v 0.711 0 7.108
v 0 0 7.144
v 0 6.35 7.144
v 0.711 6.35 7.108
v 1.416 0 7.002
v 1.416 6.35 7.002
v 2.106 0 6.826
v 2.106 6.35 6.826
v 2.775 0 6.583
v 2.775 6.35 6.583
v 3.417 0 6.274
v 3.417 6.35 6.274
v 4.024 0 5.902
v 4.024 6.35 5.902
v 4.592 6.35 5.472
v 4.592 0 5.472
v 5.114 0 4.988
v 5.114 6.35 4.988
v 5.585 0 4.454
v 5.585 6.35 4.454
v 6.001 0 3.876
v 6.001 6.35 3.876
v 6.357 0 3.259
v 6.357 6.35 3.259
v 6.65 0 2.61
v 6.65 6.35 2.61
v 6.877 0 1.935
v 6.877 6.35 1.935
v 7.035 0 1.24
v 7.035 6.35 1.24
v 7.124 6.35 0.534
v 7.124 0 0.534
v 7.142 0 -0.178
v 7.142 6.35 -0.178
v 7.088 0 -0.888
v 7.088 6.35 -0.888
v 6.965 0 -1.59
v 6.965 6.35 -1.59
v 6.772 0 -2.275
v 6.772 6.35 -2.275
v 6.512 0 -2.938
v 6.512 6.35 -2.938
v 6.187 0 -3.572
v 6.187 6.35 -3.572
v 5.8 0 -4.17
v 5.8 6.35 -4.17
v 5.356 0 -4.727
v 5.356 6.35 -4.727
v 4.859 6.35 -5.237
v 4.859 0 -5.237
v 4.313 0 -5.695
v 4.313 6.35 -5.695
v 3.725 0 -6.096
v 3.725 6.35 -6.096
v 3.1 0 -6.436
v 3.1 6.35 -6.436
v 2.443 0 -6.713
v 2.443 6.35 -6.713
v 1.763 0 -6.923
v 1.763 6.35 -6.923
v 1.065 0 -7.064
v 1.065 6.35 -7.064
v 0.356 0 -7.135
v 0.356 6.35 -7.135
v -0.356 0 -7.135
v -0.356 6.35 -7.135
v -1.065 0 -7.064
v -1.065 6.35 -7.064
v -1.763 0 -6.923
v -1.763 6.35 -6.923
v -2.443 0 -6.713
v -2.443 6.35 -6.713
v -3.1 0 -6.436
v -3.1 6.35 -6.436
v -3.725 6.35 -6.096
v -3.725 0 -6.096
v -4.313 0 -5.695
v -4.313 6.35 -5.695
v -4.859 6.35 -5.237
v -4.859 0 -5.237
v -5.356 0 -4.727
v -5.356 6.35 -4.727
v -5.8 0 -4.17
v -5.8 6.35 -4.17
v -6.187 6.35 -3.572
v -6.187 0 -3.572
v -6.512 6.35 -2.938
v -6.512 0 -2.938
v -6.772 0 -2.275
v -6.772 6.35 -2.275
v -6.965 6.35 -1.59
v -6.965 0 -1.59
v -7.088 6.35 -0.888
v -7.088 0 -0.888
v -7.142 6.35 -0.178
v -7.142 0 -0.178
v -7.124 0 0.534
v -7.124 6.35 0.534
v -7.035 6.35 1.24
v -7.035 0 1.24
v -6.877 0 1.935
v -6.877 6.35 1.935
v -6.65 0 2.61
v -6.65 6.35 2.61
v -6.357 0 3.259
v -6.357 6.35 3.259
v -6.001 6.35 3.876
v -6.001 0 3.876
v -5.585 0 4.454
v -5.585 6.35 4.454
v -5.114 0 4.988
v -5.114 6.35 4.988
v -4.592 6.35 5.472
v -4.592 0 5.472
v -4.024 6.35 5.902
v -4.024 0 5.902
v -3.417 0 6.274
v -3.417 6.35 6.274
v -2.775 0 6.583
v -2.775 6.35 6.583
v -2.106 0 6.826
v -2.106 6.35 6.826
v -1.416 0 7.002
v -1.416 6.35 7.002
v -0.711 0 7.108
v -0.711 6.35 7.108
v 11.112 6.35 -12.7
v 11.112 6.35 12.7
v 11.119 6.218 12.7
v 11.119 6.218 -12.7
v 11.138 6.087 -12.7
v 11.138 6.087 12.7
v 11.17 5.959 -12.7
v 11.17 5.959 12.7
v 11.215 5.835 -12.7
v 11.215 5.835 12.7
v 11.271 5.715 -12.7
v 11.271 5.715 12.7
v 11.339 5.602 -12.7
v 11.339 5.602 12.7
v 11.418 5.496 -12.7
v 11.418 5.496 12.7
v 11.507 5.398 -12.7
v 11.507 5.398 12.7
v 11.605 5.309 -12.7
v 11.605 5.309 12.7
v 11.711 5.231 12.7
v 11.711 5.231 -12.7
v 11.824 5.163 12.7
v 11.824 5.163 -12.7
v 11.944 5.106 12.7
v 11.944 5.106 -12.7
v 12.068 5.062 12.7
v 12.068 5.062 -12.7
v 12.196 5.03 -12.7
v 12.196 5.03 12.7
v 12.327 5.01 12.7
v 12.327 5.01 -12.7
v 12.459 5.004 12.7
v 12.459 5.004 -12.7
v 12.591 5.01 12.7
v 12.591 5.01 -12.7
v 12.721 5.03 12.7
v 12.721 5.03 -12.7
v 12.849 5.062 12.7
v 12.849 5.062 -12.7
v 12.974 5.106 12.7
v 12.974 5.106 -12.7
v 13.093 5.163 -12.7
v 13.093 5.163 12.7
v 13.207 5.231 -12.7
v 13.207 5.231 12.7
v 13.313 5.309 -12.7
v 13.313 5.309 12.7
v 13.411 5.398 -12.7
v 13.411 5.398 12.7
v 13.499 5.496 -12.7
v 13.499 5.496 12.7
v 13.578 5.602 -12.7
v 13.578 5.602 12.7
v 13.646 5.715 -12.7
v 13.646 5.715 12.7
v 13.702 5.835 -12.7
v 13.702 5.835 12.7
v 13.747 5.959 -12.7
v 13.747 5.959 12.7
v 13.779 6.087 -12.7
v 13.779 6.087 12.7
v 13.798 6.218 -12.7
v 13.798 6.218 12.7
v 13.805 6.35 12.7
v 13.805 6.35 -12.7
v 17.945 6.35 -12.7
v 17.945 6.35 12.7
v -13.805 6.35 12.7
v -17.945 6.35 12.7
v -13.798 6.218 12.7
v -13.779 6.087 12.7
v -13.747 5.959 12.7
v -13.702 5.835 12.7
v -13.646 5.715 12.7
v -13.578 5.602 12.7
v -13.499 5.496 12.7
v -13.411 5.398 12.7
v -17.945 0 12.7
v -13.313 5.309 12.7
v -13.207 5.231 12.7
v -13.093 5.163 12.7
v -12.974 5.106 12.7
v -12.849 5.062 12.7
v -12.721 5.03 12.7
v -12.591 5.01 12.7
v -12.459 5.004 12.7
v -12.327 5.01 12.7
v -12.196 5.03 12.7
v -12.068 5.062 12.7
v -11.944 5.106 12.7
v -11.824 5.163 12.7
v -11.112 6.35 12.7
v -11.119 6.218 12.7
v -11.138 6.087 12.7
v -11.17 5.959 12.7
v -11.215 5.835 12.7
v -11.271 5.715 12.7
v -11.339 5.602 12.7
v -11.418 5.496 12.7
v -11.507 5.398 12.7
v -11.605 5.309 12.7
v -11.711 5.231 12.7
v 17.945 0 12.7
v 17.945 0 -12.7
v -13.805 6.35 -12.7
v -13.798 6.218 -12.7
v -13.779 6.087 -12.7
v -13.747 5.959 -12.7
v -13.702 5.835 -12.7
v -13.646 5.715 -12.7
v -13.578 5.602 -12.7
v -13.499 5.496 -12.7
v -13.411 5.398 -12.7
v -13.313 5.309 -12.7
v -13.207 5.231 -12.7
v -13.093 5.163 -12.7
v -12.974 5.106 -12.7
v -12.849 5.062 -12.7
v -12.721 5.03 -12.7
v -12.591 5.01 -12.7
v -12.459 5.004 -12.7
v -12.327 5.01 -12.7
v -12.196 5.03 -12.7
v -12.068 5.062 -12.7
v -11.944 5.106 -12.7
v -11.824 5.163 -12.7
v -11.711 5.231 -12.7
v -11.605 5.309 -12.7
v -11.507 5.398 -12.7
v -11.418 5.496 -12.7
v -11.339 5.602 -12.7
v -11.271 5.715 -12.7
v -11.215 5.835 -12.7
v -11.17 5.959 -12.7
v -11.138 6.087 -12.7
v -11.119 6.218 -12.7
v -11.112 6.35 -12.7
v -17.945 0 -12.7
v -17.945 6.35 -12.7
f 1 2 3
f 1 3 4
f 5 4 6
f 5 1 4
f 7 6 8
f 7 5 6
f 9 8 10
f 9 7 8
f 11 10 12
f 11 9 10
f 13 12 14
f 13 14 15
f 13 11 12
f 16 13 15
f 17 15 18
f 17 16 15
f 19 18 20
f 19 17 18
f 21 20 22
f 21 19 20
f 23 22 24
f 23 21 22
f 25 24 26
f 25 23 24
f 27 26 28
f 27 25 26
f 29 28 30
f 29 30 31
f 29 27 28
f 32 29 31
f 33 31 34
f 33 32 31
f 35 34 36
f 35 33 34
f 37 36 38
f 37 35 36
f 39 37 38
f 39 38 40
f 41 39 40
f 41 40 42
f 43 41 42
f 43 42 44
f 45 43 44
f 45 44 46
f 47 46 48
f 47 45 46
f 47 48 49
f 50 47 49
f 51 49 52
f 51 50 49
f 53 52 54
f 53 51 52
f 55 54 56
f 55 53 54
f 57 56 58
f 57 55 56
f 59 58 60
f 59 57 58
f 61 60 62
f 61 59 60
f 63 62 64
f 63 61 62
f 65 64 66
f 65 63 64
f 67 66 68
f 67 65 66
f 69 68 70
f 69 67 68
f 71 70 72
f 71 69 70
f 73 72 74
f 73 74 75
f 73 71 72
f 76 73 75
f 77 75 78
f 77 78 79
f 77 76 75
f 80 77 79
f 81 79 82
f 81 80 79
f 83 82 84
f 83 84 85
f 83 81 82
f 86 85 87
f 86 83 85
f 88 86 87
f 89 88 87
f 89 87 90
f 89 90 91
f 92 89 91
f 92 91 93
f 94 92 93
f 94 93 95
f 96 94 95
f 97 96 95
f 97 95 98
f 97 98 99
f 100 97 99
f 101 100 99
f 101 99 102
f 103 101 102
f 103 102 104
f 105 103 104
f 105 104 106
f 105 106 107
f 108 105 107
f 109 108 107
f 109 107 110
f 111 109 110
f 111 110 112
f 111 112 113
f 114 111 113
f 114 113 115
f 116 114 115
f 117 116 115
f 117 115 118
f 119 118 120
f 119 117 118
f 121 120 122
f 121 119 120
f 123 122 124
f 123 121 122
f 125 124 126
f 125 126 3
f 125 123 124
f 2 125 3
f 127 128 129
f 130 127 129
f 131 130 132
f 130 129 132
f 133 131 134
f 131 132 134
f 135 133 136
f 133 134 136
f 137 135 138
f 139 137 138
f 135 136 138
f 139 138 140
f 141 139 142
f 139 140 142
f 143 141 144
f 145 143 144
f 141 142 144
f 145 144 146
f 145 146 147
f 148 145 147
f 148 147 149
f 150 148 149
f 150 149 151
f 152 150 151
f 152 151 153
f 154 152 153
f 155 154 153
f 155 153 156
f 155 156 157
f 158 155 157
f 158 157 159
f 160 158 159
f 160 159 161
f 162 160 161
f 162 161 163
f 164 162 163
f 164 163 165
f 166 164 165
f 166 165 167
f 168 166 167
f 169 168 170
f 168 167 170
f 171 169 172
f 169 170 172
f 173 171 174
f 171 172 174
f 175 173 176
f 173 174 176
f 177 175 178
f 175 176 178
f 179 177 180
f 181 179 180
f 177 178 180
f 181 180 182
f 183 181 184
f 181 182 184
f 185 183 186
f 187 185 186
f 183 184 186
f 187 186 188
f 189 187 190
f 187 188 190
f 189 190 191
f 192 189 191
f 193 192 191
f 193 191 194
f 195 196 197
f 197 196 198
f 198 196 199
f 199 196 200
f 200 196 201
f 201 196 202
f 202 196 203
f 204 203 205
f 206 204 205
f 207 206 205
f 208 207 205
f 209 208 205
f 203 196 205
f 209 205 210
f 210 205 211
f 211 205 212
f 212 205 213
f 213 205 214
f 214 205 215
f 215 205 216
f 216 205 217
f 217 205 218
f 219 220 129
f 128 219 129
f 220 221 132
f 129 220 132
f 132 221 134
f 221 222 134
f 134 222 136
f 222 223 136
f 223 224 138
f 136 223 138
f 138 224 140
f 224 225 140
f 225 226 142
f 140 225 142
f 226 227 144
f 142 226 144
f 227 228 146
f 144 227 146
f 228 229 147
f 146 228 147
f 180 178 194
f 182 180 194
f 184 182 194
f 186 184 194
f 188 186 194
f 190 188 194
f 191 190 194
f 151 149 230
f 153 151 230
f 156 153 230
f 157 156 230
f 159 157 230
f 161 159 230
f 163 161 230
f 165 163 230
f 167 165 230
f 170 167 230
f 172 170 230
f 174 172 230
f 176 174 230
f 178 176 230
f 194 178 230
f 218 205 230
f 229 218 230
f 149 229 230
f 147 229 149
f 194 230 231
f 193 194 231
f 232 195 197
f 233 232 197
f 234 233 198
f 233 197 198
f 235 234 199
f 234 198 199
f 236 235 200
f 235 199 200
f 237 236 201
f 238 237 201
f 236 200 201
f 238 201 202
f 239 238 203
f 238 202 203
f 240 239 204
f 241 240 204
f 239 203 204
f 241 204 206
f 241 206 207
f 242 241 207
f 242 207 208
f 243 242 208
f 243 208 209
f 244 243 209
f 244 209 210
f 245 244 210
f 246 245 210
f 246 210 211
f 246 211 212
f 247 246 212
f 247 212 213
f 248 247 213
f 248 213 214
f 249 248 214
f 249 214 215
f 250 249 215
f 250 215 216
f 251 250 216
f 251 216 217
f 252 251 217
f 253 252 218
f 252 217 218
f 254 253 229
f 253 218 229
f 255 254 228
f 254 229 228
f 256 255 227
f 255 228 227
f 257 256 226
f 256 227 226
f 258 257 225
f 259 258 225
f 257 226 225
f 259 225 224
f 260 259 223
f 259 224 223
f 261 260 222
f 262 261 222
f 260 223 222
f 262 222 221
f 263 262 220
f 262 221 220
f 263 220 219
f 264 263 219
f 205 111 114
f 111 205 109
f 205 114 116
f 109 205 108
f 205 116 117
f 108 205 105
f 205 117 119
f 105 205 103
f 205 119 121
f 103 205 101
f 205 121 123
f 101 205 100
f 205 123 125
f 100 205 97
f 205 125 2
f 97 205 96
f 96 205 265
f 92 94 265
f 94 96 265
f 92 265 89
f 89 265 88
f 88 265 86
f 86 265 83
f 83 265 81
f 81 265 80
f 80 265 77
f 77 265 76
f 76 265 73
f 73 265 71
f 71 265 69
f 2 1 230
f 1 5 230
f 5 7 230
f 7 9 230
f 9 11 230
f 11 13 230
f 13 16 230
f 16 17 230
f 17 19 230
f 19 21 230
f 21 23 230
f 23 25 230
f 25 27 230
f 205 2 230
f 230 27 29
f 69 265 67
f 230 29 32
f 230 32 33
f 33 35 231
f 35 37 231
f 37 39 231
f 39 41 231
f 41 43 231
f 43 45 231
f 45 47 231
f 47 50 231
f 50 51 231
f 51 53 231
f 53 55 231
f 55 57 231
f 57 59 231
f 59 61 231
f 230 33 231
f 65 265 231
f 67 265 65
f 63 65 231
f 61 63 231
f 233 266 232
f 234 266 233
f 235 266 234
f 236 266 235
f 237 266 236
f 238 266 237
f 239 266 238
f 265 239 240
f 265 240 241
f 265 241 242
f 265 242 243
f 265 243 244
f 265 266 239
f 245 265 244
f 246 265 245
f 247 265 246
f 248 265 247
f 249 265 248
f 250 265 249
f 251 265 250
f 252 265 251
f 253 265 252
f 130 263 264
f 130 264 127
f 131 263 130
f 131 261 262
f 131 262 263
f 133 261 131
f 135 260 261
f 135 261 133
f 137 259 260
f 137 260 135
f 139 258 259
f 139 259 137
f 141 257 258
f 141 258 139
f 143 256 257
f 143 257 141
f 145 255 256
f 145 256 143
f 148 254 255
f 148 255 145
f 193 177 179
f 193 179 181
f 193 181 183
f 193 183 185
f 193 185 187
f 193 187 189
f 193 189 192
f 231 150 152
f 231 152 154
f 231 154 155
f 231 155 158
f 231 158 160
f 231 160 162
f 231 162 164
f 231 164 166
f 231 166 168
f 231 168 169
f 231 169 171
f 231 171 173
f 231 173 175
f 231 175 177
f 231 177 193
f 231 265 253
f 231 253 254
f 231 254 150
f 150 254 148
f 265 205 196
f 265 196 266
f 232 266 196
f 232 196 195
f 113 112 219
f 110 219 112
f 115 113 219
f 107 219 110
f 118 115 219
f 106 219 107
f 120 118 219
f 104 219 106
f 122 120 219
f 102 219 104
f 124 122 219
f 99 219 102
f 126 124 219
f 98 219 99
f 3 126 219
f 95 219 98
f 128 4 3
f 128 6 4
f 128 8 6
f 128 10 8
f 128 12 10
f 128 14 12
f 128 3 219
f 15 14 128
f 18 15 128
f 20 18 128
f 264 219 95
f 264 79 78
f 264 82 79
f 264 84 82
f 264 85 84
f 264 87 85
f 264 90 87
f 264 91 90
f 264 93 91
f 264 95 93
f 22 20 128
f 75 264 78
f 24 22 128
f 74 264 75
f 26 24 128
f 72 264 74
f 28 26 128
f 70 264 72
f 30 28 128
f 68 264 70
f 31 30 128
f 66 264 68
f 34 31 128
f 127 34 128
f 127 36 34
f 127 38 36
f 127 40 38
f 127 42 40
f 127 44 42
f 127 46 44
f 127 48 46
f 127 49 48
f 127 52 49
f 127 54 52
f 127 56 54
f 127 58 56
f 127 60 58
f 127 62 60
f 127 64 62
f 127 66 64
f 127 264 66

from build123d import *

# Parameters (mm, degrees)
SKETCH1_W           = 35.8902
SKETCH1_H           = 25.4
SKETCH1_R           = 7.14375
BOSS_EXTRUDE1_DEPTH = 6.35
SKETCH2_R           = 1.3462
CUT_EXTRUDE1_DEPTH  = 32.741284064


with BuildPart() as part:
    # Sketch1 → Boss-Extrude1 (new body)
    with BuildSketch(Plane(origin=(0, 0, 0), x_dir=(1, 0, 0), z_dir=(0, 1, 0))):
        Rectangle(SKETCH1_W, SKETCH1_H)
        with Locations(Location((0, 0, 0), (0, 0, 270))):
            Circle(SKETCH1_R, mode=Mode.SUBTRACT)
    extrude(amount=BOSS_EXTRUDE1_DEPTH)

    # Sketch2 → Cut-Extrude1 (cut, through all)
    with BuildSketch(Plane.XY.offset(12.7)):
        with Locations((-12.4587, 6.35)):
            Circle(SKETCH2_R)
        with Locations((12.4587, 6.35)):
            Circle(SKETCH2_R)
    extrude(amount=-CUT_EXTRUDE1_DEPTH, mode=Mode.SUBTRACT)


solid = part.part
